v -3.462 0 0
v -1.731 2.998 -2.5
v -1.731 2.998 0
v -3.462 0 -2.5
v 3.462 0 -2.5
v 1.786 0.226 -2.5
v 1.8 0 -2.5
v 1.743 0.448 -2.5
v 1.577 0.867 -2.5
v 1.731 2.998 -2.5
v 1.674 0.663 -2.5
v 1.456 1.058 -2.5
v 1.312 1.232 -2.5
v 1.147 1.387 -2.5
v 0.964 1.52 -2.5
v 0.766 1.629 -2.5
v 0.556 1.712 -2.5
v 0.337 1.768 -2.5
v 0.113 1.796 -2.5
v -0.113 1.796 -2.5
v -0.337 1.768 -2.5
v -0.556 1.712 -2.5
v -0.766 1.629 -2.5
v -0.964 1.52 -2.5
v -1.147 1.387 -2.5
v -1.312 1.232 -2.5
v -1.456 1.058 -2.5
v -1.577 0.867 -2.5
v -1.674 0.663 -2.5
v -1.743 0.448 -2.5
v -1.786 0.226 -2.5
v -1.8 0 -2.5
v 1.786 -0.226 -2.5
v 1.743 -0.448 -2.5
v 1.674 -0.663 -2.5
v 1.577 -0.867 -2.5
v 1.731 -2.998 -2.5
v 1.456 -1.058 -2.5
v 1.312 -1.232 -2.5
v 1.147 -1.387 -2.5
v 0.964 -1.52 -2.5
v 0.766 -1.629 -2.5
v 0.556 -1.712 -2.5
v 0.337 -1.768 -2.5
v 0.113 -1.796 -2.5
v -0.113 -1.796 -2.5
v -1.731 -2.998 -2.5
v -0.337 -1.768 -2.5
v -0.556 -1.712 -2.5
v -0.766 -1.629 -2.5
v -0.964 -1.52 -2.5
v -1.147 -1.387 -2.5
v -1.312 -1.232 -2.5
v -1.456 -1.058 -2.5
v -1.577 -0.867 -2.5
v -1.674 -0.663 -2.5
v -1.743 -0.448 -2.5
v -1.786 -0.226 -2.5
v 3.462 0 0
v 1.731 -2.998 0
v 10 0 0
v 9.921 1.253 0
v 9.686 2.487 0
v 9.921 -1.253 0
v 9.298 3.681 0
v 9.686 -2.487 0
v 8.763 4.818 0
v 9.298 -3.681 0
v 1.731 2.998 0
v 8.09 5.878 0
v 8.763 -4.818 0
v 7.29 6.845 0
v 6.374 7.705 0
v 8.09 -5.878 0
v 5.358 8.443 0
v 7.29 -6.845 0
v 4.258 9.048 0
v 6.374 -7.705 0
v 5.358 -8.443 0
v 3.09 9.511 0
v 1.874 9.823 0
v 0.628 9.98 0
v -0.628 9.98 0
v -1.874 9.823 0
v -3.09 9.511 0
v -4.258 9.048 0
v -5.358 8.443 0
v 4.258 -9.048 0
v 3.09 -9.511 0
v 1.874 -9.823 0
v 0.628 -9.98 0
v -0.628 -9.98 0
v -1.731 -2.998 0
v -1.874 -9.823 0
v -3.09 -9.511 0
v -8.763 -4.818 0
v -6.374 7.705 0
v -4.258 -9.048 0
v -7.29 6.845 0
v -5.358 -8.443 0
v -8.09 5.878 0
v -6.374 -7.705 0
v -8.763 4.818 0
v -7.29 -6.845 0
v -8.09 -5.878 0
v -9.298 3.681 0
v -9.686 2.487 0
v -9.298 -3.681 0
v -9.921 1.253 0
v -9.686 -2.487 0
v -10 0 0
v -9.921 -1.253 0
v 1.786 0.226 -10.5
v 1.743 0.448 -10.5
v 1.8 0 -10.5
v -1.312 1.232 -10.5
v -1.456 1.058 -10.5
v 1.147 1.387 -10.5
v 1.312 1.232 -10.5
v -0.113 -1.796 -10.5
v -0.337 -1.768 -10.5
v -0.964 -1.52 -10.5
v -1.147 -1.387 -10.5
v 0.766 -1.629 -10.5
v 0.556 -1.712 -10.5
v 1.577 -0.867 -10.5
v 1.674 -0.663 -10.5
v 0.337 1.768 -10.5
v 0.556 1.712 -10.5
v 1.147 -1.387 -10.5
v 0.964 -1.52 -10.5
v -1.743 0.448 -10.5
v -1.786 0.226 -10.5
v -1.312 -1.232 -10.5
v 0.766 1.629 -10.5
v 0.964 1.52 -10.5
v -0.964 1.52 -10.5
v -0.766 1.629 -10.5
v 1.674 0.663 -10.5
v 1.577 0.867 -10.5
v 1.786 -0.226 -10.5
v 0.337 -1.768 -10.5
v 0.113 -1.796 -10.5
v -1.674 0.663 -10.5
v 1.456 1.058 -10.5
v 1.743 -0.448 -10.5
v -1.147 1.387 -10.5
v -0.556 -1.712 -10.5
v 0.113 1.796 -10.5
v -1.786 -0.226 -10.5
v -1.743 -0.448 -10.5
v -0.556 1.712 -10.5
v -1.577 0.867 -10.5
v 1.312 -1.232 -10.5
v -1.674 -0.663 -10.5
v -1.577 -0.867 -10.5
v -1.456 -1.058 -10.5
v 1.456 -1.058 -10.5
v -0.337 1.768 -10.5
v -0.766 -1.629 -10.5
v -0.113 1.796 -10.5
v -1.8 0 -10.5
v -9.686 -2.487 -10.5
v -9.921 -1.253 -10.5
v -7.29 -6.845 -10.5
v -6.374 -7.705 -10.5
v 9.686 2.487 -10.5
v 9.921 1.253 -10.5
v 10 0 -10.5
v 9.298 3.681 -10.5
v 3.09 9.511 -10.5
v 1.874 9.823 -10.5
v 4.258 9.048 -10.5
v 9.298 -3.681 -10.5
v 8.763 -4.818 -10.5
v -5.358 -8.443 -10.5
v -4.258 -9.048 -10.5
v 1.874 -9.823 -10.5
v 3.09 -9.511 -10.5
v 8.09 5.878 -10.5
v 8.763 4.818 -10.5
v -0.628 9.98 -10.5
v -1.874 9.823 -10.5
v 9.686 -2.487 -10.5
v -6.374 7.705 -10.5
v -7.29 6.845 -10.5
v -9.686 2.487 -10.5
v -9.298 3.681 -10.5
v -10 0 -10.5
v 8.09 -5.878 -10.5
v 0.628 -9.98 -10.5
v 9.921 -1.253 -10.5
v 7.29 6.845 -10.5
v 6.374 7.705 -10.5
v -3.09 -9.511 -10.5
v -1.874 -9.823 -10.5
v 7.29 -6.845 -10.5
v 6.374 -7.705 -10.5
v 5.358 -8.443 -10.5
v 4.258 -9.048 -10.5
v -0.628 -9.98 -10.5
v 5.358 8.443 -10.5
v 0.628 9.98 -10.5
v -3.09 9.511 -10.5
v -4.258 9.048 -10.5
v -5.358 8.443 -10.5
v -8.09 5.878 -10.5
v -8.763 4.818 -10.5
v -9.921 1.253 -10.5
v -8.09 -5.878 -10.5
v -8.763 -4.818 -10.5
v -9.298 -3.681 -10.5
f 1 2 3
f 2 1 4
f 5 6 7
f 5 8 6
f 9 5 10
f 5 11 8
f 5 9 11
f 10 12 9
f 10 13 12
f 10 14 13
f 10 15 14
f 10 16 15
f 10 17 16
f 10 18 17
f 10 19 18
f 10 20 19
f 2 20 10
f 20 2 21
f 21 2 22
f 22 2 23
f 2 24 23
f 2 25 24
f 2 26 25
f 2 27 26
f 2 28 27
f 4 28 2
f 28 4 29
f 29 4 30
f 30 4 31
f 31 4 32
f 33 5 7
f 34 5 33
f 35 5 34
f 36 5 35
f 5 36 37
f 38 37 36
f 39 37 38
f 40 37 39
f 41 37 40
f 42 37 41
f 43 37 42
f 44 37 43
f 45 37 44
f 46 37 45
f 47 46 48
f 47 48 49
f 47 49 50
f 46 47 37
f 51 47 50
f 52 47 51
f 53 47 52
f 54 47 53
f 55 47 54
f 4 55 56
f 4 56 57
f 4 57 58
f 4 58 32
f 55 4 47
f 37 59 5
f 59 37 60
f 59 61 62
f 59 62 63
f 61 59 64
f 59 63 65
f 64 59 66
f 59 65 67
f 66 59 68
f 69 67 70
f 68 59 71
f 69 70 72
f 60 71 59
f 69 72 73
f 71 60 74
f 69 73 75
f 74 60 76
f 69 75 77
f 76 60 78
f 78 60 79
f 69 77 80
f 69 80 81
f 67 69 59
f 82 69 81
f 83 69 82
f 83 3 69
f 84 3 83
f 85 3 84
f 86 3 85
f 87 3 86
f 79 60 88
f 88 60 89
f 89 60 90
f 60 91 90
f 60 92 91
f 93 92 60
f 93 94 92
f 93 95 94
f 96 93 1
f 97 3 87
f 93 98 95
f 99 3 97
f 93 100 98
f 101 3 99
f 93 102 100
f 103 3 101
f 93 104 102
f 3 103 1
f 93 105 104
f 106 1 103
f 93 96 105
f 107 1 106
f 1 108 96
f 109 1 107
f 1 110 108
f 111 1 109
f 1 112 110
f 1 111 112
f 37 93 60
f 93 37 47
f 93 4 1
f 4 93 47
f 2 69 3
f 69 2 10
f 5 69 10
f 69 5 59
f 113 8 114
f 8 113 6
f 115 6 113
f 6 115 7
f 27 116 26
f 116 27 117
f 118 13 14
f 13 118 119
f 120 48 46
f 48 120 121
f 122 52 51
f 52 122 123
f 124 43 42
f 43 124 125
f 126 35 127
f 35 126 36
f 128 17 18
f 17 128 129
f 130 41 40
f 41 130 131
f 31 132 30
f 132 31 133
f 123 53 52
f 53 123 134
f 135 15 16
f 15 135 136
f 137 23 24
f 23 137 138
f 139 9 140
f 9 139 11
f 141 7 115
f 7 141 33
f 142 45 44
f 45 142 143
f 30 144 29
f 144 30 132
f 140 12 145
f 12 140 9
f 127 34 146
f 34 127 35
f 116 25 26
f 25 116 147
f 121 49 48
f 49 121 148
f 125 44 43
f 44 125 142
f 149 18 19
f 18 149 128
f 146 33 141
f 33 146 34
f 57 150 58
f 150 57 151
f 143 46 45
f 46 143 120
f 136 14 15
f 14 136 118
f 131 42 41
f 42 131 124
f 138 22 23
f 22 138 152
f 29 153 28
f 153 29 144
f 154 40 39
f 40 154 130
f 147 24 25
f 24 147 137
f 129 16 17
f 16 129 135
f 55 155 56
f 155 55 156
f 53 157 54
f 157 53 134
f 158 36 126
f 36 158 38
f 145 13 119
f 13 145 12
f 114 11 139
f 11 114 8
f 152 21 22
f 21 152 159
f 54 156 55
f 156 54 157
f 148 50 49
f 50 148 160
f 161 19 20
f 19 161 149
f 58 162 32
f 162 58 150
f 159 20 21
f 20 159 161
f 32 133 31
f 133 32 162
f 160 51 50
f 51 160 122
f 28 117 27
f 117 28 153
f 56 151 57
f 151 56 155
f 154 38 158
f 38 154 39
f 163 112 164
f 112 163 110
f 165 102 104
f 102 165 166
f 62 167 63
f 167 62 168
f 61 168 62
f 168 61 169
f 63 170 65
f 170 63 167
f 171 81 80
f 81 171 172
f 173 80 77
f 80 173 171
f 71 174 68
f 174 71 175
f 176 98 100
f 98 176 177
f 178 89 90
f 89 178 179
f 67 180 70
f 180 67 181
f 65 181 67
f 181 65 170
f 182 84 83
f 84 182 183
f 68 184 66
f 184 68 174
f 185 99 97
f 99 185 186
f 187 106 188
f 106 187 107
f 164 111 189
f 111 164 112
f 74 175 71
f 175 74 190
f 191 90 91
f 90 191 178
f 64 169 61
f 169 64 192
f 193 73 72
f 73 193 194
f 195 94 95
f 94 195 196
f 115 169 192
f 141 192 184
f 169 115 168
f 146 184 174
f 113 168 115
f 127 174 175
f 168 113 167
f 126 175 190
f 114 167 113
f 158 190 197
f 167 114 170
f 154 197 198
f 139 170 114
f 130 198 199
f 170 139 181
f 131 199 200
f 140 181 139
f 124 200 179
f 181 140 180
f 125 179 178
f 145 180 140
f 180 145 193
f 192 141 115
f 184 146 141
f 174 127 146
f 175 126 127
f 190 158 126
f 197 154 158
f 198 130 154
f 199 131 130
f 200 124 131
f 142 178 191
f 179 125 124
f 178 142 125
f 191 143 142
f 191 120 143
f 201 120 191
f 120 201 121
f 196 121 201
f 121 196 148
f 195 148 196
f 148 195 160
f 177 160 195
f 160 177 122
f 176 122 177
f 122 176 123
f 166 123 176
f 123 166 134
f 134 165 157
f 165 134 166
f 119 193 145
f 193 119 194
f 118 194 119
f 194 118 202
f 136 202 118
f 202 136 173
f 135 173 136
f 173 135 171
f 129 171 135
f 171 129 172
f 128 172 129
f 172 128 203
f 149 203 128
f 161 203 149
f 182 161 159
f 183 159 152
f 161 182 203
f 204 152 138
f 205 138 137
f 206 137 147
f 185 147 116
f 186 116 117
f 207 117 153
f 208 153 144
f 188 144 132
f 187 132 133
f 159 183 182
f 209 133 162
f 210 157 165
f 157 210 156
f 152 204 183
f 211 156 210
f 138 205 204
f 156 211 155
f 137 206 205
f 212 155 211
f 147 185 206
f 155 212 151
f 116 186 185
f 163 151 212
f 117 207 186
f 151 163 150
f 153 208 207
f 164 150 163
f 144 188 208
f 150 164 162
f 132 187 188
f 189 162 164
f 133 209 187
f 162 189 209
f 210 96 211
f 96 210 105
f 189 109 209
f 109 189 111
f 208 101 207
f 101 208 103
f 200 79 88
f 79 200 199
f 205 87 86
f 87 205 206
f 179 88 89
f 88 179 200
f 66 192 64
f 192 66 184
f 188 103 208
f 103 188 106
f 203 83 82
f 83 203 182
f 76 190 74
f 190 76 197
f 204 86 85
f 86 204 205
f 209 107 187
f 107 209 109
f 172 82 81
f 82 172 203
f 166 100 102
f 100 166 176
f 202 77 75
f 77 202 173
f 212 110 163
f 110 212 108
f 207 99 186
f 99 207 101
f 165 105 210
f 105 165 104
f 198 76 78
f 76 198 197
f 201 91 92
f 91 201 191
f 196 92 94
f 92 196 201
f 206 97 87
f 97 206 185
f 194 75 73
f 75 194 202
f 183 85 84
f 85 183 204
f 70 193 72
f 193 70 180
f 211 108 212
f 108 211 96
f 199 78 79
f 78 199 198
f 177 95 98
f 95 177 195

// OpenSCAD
$fn = 50;


difference() {
	union() {
		translate(v = [0, 0, -10.5000000000]) {
			cylinder(h = 10.5000000000, r = 10.0000000000);
		}
	}
	union() {
		translate(v = [0, 0, 0]) {
			rotate(a = [0, 0, 0]) {
				difference() {
					union() {
						translate(v = [0, 0, -2.5000000000]) {
							linear_extrude(height = 2.5000000000) {
								polygon(points = [[3.4620000000, 0.0000000000], [1.7310000000, 2.9981799479], [-1.7310000000, 2.9981799479], [-3.4620000000, 0.0000000000], [-1.7310000000, -2.9981799479], [1.7310000000, -2.9981799479]]);
							}
						}
					}
					union();
				}
			}
		}
		#translate(v = [0, 0, -100.0000000000]) {
			cylinder(h = 200, r = 1.8000000000);
		}
	}
}
